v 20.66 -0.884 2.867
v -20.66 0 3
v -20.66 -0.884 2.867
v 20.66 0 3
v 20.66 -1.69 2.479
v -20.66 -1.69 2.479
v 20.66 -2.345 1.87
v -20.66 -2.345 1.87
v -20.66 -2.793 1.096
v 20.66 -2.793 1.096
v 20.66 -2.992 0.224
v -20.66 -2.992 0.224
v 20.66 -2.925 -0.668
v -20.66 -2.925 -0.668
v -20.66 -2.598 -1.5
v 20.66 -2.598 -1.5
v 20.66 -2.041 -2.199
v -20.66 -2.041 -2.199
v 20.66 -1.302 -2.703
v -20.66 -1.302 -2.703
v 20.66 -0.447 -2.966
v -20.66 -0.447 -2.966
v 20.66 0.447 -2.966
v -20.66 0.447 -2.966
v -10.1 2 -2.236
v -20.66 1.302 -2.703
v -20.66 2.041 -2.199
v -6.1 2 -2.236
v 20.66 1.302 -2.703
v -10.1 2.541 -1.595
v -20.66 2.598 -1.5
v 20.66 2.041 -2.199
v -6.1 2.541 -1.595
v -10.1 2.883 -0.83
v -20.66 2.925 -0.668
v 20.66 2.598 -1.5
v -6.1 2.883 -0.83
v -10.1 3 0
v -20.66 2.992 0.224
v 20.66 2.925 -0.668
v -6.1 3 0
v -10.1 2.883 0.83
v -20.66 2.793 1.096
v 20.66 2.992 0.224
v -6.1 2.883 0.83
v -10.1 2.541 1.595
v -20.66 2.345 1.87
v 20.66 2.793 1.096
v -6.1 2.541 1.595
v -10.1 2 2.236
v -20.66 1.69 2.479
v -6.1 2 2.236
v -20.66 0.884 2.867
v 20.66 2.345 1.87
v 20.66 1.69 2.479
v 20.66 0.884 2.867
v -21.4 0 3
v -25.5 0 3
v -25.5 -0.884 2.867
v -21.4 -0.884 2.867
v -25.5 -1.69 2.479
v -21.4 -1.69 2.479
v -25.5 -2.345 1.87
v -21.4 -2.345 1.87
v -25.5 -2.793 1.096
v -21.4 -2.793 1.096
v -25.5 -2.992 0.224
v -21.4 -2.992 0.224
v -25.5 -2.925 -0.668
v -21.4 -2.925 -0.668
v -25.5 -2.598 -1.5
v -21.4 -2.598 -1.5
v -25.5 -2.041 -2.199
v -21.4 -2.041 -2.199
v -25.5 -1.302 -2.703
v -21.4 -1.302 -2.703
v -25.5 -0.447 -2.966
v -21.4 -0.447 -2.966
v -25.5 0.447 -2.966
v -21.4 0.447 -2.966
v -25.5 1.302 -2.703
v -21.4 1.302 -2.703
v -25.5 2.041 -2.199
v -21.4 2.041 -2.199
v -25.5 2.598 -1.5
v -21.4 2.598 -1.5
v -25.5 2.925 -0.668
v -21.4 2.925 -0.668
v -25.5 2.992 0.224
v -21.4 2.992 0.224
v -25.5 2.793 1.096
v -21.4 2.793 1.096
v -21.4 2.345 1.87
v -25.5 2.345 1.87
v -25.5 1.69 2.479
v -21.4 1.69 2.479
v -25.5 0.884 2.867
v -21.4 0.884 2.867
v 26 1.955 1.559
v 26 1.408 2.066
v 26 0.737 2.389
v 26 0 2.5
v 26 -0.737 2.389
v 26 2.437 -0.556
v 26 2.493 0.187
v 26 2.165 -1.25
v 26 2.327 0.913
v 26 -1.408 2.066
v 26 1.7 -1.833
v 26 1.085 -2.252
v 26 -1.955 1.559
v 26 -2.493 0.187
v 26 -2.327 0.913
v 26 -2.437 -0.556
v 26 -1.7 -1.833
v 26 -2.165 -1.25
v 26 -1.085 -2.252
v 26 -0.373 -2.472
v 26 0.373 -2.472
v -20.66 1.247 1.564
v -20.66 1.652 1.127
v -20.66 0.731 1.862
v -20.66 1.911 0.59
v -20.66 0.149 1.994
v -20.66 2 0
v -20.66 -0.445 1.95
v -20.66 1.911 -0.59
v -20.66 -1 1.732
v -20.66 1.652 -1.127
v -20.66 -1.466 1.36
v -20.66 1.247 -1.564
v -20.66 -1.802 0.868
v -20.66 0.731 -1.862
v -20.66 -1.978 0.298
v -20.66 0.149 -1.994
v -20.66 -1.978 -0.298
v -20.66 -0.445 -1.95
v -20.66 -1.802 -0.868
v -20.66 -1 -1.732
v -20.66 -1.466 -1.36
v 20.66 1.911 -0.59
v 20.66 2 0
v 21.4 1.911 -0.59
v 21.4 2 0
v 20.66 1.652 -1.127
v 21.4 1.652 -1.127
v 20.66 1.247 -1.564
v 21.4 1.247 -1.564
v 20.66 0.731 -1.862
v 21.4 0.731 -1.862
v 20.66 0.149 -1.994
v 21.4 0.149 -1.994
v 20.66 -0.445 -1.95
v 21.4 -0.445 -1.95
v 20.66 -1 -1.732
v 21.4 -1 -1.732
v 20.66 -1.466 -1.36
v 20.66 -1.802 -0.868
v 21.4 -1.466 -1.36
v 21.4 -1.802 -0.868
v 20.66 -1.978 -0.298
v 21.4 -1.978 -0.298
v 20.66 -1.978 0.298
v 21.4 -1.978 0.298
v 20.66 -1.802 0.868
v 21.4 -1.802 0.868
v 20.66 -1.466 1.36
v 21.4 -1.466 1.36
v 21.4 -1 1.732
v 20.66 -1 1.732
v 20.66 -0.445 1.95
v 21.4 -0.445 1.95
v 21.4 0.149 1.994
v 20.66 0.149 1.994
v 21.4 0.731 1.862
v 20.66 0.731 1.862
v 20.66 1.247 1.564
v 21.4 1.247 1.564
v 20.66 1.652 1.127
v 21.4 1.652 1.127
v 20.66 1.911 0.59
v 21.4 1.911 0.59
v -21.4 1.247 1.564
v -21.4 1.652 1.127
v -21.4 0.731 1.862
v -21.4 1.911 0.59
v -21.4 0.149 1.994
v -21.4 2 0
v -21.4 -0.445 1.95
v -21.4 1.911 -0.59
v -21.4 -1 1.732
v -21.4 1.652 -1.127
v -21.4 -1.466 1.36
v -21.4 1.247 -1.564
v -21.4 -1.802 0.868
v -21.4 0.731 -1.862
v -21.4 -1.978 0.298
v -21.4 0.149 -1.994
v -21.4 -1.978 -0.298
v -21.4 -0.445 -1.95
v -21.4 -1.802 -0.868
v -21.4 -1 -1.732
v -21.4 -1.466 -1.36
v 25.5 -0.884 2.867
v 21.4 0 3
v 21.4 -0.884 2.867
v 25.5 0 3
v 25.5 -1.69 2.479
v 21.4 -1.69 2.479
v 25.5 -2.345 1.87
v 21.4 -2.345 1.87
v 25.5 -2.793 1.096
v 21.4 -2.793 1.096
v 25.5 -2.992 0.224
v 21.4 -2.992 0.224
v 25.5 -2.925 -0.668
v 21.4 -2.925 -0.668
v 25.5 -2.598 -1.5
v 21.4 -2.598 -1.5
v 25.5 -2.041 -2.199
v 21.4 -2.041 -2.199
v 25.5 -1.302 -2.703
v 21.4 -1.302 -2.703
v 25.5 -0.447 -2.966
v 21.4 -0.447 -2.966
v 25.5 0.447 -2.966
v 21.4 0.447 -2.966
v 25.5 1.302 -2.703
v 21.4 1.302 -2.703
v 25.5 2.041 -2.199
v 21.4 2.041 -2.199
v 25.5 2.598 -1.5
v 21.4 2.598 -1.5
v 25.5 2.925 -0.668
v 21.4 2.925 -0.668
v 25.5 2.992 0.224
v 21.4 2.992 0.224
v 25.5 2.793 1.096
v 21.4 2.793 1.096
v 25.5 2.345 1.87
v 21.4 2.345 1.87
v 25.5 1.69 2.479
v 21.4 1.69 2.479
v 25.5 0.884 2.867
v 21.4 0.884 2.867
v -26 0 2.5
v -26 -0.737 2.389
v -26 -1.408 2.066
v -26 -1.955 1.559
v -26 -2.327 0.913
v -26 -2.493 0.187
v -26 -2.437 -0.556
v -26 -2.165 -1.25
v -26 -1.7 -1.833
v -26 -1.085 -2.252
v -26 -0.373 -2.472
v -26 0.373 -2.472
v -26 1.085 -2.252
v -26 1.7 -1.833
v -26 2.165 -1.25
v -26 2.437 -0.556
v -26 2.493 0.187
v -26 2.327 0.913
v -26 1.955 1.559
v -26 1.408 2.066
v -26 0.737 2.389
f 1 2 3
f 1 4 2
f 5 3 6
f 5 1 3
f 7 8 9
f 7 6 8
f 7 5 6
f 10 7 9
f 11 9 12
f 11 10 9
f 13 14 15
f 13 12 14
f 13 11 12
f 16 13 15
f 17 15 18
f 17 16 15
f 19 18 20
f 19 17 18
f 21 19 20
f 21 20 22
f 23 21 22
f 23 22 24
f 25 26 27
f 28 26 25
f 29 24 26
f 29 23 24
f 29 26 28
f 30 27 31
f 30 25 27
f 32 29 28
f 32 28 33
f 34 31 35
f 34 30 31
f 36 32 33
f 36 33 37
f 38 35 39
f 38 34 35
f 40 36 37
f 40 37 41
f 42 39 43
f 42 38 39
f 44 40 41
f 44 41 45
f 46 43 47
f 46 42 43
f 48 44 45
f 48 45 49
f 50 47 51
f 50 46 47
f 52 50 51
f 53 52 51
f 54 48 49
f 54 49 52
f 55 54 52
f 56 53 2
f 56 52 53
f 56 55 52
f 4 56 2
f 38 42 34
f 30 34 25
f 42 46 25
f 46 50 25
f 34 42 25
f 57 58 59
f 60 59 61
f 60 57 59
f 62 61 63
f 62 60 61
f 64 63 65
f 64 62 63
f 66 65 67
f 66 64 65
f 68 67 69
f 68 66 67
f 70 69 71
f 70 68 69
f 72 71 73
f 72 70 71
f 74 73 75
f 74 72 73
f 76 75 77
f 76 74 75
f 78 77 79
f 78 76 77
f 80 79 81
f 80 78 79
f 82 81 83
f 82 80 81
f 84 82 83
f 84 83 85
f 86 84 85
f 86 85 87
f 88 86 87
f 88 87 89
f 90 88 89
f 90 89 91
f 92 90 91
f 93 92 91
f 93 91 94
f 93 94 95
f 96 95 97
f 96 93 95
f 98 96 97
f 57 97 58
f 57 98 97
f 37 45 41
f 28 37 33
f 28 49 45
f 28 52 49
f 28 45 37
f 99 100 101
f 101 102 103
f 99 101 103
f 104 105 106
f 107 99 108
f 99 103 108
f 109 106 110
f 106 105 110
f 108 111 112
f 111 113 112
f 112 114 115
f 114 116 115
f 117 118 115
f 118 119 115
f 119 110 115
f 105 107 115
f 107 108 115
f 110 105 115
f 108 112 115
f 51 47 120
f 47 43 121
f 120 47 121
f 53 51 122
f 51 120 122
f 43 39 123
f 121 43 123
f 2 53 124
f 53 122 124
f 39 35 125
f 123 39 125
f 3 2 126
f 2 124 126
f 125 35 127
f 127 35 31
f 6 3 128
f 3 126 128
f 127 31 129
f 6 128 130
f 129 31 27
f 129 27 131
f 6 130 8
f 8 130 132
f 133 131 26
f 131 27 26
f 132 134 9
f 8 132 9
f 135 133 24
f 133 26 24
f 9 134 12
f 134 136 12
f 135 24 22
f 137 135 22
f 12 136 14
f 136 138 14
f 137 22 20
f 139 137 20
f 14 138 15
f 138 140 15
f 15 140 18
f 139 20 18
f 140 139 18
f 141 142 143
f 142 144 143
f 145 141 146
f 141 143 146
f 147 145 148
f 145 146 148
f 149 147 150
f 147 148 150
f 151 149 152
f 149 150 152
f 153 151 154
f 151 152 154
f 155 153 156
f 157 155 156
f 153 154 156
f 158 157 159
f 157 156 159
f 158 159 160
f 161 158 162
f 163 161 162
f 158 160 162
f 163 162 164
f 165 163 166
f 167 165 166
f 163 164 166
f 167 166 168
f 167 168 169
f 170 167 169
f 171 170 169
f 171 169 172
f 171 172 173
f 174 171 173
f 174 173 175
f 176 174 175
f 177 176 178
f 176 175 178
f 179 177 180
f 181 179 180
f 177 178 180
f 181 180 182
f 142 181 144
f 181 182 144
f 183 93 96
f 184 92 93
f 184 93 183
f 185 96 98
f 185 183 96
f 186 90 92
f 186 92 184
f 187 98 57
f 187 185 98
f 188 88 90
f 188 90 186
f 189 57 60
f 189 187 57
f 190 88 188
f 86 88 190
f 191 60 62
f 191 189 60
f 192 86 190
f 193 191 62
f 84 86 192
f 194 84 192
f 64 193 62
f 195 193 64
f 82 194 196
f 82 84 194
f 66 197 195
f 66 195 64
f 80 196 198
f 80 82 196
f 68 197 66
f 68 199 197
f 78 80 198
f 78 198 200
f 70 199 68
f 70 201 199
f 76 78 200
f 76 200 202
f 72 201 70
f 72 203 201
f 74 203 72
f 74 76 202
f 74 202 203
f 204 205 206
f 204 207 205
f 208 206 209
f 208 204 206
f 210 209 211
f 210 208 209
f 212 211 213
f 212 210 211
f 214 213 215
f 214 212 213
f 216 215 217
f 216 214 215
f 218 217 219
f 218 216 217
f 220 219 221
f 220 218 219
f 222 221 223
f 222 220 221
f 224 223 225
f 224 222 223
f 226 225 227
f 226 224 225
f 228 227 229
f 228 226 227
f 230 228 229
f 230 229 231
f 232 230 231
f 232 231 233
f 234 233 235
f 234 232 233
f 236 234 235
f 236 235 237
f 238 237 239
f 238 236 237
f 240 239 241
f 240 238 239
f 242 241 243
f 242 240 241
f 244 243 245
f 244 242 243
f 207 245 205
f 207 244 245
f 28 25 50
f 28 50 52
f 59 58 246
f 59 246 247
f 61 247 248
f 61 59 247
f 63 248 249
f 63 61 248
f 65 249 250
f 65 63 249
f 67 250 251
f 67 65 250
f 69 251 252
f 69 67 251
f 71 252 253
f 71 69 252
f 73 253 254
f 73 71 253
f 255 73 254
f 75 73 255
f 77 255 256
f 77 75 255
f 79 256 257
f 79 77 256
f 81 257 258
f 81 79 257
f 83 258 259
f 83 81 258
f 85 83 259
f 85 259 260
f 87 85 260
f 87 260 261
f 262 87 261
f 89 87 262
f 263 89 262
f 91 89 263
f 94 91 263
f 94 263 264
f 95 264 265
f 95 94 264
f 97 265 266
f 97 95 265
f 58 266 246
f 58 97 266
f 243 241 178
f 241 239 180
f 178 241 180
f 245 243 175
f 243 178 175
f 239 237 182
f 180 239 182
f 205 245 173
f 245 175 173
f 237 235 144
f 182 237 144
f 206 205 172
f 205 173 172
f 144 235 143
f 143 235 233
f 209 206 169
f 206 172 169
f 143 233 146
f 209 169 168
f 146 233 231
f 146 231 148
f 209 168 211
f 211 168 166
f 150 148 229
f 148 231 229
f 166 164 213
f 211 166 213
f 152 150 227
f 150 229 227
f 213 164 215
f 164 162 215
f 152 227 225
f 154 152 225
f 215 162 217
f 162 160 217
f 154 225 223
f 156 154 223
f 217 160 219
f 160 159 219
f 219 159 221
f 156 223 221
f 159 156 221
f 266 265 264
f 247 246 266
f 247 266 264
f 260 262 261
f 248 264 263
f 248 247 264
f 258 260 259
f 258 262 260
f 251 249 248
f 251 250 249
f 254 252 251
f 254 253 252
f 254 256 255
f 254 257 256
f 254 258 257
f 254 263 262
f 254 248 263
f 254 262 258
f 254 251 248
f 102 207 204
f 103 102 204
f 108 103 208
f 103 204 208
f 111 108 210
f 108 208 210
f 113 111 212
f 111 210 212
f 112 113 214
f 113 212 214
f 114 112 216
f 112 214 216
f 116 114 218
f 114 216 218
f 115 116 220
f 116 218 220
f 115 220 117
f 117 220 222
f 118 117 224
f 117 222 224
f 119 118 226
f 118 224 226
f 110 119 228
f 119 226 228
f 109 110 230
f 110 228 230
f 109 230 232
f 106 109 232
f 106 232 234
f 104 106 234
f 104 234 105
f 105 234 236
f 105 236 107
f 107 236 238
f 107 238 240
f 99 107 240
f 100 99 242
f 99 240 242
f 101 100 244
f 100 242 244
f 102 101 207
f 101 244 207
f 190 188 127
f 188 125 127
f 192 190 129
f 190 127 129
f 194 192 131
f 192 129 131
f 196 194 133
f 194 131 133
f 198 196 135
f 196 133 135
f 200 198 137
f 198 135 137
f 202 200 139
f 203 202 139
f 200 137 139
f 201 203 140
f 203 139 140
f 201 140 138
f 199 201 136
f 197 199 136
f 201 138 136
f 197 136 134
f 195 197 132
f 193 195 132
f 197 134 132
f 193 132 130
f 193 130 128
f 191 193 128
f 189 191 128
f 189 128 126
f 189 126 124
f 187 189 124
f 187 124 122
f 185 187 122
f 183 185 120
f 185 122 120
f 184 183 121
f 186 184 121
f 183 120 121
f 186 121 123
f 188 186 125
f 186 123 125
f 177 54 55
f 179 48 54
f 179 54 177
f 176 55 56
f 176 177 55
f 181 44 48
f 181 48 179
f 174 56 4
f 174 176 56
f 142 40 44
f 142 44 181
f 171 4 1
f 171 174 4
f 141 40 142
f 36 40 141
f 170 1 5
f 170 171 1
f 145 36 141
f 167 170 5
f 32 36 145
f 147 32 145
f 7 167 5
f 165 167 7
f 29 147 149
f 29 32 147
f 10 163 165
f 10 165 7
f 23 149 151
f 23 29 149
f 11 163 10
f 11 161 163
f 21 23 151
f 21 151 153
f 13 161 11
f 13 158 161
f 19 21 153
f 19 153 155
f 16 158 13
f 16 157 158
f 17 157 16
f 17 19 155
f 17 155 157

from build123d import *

# Parameters (mm, degrees)
ESQUISSE1_W                  = 52
ESQUISSE1_H                  = 3
CHANFREIN1_SIZE              = 0.5
ENL_V_MAT_EXTRU_1_DEPTH      = 27.343879745
ENL_V_MAT_EXTRU_1_DEPTH_BACK = 27.343879745
ESQUISSE2_W                  = 4
ESQUISSE2_H                  = 2
ESQUISSE3_W                  = 0.74
ESQUISSE3_H                  = 1


with BuildPart() as part:
    # Esquisse1 → Révolution1 (revolve)
    with BuildSketch(Plane.XY, mode=Mode.PRIVATE) as r_volution1_sk:
        with Locations((0, 1.5)):
            Rectangle(ESQUISSE1_W, ESQUISSE1_H)
    revolve(r_volution1_sk.sketch.rotate(Axis((0, 0, 0), (1, 0, 0)), 90), axis=Axis((0, 0, 0), (1, 0, 0)))

    # Chanfrein1
    chanfrein1_edges = [part.edges().sort_by_distance(p)[0] for p in [
        (26, 0, -3),
        (-26, 0, -3),
    ]]
    chamfer(chanfrein1_edges, length=CHANFREIN1_SIZE)

    # Esquisse2 → Enlèv. mat.-Extru.1 (cut, two sides: drawn at the far end of the back side and taken through both)
    with BuildSketch(Plane.XY.offset(-ENL_V_MAT_EXTRU_1_DEPTH_BACK)):
        with Locations((-8.1, 3)):
            Rectangle(ESQUISSE2_W, ESQUISSE2_H)
    extrude(amount=ENL_V_MAT_EXTRU_1_DEPTH + ENL_V_MAT_EXTRU_1_DEPTH_BACK, mode=Mode.SUBTRACT)

    # Esquisse3 → Enlèvement de matière-Révolution1 (revolve, cut)
    with BuildSketch(Plane.XY):
        with Locations((-21.03, 2.5)):
            Rectangle(ESQUISSE3_W, ESQUISSE3_H)
        with Locations((21.03, 2.5)):
            Rectangle(ESQUISSE3_W, ESQUISSE3_H)
    revolve(axis=Axis((0, 0, 0), (-1, 0, 0)), mode=Mode.SUBTRACT)


solid = part.part
